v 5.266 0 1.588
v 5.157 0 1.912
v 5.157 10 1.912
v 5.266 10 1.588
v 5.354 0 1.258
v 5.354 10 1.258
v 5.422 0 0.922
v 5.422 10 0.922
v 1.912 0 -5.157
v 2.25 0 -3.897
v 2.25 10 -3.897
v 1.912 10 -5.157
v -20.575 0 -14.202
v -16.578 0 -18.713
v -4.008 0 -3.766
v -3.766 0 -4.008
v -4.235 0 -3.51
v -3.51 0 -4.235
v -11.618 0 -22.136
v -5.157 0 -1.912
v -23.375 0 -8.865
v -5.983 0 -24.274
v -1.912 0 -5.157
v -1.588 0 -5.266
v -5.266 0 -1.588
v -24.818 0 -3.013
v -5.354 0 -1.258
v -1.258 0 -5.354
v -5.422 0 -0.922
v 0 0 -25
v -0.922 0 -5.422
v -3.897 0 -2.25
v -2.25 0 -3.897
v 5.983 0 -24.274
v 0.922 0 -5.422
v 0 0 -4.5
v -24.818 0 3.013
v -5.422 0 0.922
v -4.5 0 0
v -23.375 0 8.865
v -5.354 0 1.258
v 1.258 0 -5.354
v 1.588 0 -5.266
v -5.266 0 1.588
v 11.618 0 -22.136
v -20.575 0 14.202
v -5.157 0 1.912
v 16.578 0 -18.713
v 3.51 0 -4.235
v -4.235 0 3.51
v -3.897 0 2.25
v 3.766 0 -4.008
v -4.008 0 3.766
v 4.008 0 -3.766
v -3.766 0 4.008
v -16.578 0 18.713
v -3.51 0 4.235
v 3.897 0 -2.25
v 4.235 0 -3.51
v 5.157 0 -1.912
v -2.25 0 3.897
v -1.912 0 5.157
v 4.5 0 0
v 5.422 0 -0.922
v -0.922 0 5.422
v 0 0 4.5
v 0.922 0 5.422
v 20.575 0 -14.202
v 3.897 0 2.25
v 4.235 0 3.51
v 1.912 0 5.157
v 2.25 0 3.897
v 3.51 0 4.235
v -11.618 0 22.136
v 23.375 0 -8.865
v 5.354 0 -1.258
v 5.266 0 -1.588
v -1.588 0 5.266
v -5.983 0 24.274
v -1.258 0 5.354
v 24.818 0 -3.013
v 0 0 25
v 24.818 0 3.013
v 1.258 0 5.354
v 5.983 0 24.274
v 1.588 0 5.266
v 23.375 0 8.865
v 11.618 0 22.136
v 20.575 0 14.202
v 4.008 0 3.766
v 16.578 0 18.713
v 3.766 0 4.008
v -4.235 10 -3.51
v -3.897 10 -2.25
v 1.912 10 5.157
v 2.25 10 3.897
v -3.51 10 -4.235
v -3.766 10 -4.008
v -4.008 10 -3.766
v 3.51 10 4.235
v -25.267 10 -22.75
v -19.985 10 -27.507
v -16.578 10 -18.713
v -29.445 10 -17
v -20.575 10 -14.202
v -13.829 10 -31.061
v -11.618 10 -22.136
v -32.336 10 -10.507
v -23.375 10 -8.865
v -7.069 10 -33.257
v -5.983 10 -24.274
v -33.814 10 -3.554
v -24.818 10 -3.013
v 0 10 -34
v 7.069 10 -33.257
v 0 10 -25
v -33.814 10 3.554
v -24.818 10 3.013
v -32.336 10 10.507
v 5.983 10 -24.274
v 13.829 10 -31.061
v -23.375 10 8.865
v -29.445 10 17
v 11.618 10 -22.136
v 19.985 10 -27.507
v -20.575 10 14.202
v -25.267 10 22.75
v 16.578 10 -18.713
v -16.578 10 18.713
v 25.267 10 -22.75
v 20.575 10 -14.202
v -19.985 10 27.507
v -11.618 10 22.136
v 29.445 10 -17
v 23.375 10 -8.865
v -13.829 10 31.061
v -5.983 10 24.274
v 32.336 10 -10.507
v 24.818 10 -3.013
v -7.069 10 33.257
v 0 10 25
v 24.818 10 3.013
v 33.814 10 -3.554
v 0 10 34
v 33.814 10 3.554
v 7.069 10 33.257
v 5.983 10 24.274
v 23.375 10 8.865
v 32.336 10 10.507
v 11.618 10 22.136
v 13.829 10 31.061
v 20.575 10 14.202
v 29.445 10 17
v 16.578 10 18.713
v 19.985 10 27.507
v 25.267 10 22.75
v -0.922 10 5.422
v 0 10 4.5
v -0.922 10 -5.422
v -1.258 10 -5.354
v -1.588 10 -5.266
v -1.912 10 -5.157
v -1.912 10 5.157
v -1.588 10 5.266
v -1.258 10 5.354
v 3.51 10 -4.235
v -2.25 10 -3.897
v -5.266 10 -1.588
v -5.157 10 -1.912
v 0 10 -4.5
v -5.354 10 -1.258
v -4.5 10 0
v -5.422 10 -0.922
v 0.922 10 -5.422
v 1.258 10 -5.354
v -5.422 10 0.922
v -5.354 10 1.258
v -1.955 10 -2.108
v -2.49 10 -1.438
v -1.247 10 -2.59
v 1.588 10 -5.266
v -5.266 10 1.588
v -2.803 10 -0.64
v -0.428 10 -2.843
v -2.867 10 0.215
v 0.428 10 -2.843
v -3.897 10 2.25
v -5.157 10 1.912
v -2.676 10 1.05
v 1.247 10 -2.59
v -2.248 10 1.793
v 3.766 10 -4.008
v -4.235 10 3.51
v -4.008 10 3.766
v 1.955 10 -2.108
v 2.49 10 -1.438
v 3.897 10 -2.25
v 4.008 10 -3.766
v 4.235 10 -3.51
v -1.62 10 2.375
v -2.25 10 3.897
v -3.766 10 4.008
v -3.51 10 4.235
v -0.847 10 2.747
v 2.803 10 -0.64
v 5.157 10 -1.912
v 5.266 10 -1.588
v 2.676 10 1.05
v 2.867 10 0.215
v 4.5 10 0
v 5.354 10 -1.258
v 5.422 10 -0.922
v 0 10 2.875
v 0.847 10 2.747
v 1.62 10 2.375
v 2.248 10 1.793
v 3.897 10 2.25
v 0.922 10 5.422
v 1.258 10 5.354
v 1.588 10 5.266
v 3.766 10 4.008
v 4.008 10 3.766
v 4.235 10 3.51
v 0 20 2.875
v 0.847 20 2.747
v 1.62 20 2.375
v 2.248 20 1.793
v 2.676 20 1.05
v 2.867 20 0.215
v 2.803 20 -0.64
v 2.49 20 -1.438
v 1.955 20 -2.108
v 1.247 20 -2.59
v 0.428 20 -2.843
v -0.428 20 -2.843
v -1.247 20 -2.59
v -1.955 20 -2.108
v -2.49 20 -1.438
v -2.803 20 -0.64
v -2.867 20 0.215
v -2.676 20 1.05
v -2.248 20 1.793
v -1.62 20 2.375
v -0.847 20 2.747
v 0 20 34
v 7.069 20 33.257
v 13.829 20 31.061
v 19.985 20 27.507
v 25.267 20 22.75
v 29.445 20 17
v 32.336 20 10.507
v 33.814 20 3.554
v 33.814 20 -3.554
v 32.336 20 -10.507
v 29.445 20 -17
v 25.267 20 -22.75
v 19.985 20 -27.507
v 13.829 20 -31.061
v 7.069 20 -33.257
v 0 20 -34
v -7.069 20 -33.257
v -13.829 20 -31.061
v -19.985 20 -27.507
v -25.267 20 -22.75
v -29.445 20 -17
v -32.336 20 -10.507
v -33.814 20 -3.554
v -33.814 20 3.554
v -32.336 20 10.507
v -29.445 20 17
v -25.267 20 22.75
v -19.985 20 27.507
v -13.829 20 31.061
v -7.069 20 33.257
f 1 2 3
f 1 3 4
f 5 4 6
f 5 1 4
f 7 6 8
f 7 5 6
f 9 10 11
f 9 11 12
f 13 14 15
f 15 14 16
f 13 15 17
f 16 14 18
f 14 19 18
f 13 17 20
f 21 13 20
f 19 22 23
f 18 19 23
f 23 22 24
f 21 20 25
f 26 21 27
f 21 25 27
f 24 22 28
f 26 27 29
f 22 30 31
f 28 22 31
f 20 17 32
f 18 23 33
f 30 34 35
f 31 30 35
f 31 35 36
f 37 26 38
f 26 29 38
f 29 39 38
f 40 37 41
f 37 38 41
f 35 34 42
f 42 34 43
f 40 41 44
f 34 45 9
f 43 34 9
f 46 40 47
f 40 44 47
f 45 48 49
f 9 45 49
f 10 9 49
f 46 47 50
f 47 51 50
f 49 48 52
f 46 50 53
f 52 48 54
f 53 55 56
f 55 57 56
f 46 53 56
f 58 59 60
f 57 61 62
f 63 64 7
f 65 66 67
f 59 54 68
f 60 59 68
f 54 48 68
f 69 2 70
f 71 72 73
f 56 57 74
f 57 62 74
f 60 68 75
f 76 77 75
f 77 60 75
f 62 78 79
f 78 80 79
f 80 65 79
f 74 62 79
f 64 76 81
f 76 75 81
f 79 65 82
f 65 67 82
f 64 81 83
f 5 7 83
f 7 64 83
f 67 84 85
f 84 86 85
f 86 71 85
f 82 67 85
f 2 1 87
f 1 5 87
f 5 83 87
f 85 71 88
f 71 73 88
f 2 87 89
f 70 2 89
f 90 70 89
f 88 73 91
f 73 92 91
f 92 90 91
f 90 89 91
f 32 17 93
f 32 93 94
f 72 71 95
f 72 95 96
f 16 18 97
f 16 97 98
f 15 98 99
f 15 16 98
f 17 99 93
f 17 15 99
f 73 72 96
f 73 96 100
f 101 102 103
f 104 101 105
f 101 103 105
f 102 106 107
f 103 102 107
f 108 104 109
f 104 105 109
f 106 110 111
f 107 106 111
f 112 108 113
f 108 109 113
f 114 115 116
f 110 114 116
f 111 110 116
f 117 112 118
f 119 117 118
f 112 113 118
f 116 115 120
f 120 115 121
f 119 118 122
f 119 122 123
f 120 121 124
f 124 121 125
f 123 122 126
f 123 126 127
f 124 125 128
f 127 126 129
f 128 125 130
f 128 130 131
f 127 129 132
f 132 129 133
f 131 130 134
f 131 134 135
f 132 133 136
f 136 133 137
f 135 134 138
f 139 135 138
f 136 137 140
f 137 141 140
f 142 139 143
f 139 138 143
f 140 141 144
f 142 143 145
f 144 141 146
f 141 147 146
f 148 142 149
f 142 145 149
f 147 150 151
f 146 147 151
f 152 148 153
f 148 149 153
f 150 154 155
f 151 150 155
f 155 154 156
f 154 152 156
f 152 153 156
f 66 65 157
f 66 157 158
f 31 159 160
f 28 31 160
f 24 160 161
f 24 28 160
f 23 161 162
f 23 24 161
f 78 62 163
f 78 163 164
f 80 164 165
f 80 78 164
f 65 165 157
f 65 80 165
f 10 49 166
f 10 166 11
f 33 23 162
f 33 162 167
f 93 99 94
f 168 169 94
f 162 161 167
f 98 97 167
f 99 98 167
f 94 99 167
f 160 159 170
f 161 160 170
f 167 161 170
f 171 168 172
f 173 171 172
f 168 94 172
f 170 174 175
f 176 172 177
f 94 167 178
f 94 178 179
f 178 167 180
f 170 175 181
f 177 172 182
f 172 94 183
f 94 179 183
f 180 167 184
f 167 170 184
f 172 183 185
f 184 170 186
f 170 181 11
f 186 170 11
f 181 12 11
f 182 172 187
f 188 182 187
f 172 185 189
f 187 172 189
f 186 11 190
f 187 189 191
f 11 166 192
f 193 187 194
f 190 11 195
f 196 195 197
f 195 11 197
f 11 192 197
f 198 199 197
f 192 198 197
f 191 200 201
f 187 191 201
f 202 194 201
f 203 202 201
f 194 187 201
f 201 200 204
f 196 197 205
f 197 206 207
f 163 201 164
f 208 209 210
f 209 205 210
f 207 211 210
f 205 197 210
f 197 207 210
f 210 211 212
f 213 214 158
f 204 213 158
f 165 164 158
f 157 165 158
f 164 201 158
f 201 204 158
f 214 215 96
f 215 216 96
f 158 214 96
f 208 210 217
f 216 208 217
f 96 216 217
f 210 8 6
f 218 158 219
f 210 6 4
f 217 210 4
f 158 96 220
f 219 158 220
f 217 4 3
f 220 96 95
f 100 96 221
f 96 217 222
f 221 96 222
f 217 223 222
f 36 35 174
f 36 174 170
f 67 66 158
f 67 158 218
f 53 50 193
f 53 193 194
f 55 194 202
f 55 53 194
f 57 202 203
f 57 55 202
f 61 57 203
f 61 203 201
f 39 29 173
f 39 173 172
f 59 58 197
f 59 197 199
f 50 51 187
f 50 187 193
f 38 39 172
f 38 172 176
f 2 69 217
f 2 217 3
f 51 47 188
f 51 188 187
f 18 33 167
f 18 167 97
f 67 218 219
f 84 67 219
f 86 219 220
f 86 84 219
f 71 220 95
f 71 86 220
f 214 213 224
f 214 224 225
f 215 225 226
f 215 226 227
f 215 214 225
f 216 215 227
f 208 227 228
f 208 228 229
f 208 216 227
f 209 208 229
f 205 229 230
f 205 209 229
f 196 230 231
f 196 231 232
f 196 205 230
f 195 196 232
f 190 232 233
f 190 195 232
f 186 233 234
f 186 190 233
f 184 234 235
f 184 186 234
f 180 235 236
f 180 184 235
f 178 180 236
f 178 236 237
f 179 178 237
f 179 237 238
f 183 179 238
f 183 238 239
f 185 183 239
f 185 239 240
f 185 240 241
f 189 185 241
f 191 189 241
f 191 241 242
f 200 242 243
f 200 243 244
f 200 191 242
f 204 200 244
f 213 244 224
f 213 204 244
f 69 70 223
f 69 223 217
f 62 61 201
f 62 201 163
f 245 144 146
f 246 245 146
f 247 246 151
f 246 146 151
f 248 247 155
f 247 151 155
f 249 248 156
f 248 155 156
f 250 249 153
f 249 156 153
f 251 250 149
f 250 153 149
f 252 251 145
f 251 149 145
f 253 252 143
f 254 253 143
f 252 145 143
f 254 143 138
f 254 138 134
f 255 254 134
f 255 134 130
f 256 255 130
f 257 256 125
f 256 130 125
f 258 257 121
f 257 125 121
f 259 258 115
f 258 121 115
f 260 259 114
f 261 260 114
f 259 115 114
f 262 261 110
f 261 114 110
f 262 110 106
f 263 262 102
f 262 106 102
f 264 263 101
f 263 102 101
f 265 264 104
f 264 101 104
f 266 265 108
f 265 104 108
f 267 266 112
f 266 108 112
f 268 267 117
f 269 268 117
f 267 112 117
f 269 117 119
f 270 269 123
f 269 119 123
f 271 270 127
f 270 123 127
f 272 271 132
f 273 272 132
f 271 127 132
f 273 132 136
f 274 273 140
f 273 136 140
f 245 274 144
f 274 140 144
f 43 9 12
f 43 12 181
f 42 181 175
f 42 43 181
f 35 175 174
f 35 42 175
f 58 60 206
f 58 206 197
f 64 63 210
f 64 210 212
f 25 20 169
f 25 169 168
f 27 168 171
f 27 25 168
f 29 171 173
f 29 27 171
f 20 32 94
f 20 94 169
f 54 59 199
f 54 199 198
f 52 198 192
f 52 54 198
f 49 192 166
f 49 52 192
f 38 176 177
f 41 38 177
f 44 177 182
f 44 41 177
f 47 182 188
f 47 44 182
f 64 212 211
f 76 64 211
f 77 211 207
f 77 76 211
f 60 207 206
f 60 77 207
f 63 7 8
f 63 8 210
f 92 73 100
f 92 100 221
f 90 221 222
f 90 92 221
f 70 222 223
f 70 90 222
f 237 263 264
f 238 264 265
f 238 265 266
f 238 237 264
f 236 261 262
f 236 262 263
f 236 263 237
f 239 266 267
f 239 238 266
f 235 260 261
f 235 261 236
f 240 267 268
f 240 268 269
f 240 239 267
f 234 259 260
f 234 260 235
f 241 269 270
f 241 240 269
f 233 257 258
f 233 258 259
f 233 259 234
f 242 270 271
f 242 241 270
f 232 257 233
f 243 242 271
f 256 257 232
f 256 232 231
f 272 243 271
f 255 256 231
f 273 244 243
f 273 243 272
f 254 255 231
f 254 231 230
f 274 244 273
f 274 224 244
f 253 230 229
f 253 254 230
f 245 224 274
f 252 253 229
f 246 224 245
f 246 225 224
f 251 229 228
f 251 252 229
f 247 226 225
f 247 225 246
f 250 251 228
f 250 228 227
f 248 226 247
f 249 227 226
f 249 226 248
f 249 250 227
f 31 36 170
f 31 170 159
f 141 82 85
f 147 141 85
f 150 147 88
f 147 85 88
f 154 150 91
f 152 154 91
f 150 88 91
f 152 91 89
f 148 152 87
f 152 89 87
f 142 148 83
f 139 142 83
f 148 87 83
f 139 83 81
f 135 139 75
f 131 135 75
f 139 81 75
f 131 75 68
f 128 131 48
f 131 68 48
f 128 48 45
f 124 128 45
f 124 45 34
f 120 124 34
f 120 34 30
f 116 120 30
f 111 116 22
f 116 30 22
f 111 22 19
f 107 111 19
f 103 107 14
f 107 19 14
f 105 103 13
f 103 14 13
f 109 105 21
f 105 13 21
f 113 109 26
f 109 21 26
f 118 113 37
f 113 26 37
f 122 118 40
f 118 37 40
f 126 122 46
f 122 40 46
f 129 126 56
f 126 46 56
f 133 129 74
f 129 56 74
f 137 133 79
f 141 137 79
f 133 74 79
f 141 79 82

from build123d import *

# Parameters (mm, degrees)
SKETCH1_R           = 25
BOSS_EXTRUDE1_DEPTH = 10
SKETCH2_R           = 34
SKETCH2_R_2         = 2.875
BOSS_EXTRUDE2_DEPTH = 10


with BuildPart() as part:
    # Sketch1 → Boss-Extrude1 (new body)
    with BuildSketch(Plane(origin=(0, 0, 0), x_dir=(1, 0, 0), z_dir=(0, 1, 0))):
        with Locations(Location((0, 0, 0), (0, 0, 270))):
            Circle(SKETCH1_R)
        with BuildLine():
            Line((0, 4.5), (-0.922144385, 5.422144385))
            ThreePointArc((-0.922144385, 5.422144385), (-1.423504748, 5.312592045), (-1.912471729, 5.156786973))
            Line((-1.912471729, 5.156786973), (-2.25, 3.897114317))
            Line((-2.25, 3.897114317), (-3.509672656, 4.234642588))
            ThreePointArc((-3.509672656, 4.234642588), (-3.889087297, 3.889087297), (-4.234642588, 3.509672656))
            Line((-4.234642588, 3.509672656), (-3.897114317, 2.25))
            Line((-3.897114317, 2.25), (-5.156786973, 1.912471729))
            ThreePointArc((-5.156786973, 1.912471729), (-5.312592045, 1.423504748), (-5.422144385, 0.922144385))
            Line((-5.422144385, 0.922144385), (-4.5, 0))
            Line((-4.5, 0), (-5.422144385, -0.922144385))
            ThreePointArc((-5.422144385, -0.922144385), (-5.312592045, -1.423504748), (-5.156786973, -1.912471729))
            Line((-5.156786973, -1.912471729), (-3.897114317, -2.25))
            Line((-3.897114317, -2.25), (-4.234642588, -3.509672656))
            ThreePointArc((-4.234642588, -3.509672656), (-3.889087297, -3.889087297), (-3.509672656, -4.234642588))
            Line((-3.509672656, -4.234642588), (-2.25, -3.897114317))
            Line((-2.25, -3.897114317), (-1.912471729, -5.156786973))
            ThreePointArc((-1.912471729, -5.156786973), (-1.423504748, -5.312592045), (-0.922144385, -5.422144385))
            Line((-0.922144385, -5.422144385), (0, -4.5))
            Line((0, -4.5), (0.922144385, -5.422144385))
            ThreePointArc((0.922144385, -5.422144385), (1.423504748, -5.312592045), (1.912471729, -5.156786973))
            Line((1.912471729, -5.156786973), (2.25, -3.897114317))
            Line((2.25, -3.897114317), (3.509672656, -4.234642588))
            ThreePointArc((3.509672656, -4.234642588), (3.889087297, -3.889087297), (4.234642588, -3.509672656))
            Line((4.234642588, -3.509672656), (3.897114317, -2.25))
            Line((3.897114317, -2.25), (5.156786973, -1.912471729))
            ThreePointArc((5.156786973, -1.912471729), (5.312592045, -1.423504748), (5.422144385, -0.922144385))
            Line((5.422144385, -0.922144385), (4.5, 0))
            Line((4.5, 0), (5.422144385, 0.922144385))
            ThreePointArc((5.422144385, 0.922144385), (5.312592045, 1.423504748), (5.156786973, 1.912471729))
            Line((5.156786973, 1.912471729), (3.897114317, 2.25))
            Line((3.897114317, 2.25), (4.234642588, 3.509672656))
            ThreePointArc((4.234642588, 3.509672656), (3.889087297, 3.889087297), (3.509672656, 4.234642588))
            Line((3.509672656, 4.234642588), (2.25, 3.897114317))
            Line((2.25, 3.897114317), (1.912471729, 5.156786973))
            ThreePointArc((1.912471729, 5.156786973), (1.423504748, 5.312592045), (0.922144385, 5.422144385))
            Line((0.922144385, 5.422144385), (0, 4.5))
        make_face(mode=Mode.SUBTRACT)
    extrude(amount=BOSS_EXTRUDE1_DEPTH)

    # Sketch2 → Boss-Extrude2 (add)
    with BuildSketch(Plane(origin=(0, 10, 0), x_dir=(1, 0, 0), z_dir=(0, 1, 0))):
        with Locations(Location((0, 0, 0), (0, 0, 270))):
            Circle(SKETCH2_R)
        with Locations(Location((0, 0, 0), (0, 0, 270))):
            Circle(SKETCH2_R_2, mode=Mode.SUBTRACT)
    extrude(amount=BOSS_EXTRUDE2_DEPTH)


solid = part.part
